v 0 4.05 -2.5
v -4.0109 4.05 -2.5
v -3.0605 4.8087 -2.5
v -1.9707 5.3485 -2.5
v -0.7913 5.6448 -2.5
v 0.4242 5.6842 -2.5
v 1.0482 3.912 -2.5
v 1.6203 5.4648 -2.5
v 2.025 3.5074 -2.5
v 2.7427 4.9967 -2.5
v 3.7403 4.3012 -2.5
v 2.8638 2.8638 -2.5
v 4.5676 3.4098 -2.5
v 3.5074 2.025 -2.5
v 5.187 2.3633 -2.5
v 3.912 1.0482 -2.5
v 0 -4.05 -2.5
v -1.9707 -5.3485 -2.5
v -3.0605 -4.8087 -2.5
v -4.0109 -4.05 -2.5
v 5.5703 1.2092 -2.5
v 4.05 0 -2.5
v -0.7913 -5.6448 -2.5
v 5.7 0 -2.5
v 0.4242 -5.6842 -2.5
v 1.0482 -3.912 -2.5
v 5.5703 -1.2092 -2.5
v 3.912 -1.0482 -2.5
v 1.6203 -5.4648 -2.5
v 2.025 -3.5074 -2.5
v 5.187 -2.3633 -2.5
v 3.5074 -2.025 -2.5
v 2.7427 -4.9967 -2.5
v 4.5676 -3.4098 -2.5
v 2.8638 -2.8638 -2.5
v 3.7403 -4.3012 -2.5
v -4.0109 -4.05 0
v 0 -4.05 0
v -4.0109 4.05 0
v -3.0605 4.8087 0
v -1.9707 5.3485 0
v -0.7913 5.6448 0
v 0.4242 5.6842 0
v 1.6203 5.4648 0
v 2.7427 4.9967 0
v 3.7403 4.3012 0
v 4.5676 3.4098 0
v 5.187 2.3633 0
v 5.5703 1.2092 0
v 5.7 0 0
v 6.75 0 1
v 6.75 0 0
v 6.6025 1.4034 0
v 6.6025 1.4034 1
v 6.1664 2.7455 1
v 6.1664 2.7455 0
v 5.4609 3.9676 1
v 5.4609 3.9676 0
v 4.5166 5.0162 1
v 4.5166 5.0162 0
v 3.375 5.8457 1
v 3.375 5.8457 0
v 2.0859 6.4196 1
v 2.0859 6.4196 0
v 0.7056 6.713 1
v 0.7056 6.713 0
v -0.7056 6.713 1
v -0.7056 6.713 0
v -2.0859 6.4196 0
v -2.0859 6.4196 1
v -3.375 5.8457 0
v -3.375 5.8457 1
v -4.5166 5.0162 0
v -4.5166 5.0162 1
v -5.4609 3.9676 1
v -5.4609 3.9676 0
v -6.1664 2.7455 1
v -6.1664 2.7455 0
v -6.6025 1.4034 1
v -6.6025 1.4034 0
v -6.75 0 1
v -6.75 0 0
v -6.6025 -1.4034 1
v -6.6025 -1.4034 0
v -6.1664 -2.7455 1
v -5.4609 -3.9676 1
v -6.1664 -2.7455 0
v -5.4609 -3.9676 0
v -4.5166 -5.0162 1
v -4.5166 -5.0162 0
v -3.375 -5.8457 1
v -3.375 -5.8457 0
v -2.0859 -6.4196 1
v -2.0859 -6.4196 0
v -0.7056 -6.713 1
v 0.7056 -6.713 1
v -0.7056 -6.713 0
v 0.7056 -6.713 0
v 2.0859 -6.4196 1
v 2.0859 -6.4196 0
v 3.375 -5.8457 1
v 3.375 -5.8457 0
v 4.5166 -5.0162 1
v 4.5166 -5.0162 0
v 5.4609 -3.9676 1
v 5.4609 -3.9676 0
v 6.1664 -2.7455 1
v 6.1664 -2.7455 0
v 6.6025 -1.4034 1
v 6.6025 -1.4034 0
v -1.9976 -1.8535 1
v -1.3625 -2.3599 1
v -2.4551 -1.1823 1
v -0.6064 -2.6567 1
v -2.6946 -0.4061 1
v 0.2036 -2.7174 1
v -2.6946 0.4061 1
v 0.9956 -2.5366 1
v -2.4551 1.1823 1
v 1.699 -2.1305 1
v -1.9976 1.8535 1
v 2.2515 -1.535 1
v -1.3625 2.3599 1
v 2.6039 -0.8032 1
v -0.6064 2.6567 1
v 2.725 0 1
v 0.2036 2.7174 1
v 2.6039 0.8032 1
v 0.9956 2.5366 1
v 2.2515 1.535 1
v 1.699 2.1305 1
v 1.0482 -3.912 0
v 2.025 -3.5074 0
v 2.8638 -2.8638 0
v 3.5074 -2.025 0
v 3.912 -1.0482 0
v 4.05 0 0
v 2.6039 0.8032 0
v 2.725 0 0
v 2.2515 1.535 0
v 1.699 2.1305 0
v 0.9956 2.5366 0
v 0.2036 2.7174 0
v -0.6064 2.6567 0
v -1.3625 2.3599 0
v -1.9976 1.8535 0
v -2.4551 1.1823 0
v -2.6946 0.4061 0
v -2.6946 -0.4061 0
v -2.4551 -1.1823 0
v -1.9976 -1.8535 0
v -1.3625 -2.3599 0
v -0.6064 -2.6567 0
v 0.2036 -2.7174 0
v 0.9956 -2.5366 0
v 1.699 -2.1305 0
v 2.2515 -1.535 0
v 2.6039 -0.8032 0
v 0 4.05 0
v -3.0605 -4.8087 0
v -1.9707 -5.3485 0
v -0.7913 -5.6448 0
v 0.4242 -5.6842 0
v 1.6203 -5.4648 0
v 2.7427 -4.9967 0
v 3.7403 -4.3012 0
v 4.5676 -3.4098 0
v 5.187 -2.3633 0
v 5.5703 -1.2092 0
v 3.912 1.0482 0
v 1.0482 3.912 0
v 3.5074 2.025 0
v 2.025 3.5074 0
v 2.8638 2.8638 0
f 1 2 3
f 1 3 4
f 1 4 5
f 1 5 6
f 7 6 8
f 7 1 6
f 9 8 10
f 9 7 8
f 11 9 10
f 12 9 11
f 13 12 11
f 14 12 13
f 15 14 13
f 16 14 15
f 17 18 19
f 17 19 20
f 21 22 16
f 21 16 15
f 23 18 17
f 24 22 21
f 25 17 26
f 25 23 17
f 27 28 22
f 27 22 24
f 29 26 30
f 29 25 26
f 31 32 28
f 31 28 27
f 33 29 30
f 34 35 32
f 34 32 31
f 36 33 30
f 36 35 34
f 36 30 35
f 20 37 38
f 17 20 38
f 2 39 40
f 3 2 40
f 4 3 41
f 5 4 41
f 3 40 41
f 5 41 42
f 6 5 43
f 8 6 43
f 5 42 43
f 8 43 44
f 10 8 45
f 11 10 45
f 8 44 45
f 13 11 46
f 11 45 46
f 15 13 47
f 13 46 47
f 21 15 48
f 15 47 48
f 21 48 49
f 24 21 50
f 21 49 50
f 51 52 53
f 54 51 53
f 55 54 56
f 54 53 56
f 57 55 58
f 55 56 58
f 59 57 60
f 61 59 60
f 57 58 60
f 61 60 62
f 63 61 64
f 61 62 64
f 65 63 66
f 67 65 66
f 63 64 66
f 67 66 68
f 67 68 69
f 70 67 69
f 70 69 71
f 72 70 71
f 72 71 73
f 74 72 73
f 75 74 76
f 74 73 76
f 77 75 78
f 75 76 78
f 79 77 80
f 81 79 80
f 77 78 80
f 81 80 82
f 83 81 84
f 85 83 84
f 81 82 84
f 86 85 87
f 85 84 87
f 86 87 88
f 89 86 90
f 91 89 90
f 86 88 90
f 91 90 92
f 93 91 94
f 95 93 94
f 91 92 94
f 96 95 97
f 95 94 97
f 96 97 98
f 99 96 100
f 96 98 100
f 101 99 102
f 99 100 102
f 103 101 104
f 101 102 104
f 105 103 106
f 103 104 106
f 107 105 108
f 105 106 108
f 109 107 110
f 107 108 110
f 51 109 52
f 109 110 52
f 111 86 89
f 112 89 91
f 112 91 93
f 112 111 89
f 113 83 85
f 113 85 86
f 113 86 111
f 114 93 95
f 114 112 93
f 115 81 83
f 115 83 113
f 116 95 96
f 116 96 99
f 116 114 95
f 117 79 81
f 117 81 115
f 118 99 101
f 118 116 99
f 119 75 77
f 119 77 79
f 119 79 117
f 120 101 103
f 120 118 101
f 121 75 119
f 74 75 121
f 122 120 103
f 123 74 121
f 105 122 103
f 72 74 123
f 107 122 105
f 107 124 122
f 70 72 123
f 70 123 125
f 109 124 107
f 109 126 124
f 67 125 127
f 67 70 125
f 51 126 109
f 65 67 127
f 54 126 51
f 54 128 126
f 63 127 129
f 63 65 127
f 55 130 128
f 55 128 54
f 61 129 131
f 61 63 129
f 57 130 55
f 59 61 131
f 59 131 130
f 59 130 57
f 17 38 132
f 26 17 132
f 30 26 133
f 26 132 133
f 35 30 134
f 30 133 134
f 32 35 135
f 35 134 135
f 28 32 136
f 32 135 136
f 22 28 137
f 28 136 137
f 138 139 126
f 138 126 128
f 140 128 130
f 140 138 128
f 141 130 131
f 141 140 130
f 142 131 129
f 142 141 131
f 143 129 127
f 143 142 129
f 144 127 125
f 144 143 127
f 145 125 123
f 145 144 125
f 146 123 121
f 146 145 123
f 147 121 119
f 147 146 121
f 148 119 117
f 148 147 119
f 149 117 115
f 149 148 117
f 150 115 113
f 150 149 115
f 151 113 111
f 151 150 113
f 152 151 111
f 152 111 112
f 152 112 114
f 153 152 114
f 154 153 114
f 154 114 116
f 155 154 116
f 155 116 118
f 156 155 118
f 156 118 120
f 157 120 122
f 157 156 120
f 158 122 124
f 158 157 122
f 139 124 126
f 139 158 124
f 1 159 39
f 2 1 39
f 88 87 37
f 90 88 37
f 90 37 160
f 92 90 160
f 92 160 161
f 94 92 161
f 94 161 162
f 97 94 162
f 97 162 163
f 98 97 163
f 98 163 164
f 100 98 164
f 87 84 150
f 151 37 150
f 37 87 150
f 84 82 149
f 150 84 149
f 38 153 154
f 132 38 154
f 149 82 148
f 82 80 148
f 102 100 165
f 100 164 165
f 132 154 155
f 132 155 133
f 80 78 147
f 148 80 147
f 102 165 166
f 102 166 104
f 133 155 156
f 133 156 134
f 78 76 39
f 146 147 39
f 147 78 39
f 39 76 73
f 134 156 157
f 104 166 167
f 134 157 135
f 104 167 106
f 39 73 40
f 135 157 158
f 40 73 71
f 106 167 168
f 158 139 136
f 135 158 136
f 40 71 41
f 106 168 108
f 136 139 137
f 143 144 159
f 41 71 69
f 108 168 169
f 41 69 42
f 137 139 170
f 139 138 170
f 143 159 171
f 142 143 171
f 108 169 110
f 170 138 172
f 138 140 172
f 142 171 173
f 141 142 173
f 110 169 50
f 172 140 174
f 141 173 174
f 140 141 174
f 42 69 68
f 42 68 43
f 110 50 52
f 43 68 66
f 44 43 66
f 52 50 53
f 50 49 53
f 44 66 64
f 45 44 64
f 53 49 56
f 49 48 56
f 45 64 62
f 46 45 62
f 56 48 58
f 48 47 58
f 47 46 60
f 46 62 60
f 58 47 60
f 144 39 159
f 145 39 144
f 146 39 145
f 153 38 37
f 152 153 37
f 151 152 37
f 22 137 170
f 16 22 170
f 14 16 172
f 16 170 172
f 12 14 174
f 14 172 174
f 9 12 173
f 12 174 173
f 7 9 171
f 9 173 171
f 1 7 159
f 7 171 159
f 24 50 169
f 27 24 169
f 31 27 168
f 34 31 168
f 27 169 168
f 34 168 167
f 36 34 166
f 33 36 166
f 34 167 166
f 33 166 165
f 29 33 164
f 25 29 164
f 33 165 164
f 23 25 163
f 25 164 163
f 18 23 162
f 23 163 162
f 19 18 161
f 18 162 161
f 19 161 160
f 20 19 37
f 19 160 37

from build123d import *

# Parameters (mm, degrees)
F0_R     = 6.75
F0_R_2   = 2.725
F1_DEPTH = 1
F3_DEPTH = 2.5


with BuildPart() as f1:
    # F0 (on Top) → F1 (new body)
    with BuildSketch(Plane.XY):
        Circle(F0_R)
        Circle(F0_R_2, mode=Mode.SUBTRACT)
    extrude(amount=F1_DEPTH)

    # F2 (on face) → F3 (join)
    with BuildSketch(Plane(origin=(0, 0, 0), x_dir=(1, 0, 0), z_dir=(0, 0, -1))):
        with BuildLine():
            ThreePointArc((-4.0109225871, -4.05), (2.1940534694, -5.2608107145), (5.7, 0))
            ThreePointArc((5.7, 0), (2.1940534694, 5.2608107145), (-4.0109225871, 4.05))
            Line((-4.0109225871, 4.05), (0, 4.05))
            ThreePointArc((0, 4.05), (2.8637824638, 2.8637824638), (4.05, 0))
            ThreePointArc((4.05, 0), (2.8637824638, -2.8637824638), (0, -4.05))
            Line((0, -4.05), (-4.0109225871, -4.05))
        make_face()
    extrude(amount=F3_DEPTH)


solid = f1.part
